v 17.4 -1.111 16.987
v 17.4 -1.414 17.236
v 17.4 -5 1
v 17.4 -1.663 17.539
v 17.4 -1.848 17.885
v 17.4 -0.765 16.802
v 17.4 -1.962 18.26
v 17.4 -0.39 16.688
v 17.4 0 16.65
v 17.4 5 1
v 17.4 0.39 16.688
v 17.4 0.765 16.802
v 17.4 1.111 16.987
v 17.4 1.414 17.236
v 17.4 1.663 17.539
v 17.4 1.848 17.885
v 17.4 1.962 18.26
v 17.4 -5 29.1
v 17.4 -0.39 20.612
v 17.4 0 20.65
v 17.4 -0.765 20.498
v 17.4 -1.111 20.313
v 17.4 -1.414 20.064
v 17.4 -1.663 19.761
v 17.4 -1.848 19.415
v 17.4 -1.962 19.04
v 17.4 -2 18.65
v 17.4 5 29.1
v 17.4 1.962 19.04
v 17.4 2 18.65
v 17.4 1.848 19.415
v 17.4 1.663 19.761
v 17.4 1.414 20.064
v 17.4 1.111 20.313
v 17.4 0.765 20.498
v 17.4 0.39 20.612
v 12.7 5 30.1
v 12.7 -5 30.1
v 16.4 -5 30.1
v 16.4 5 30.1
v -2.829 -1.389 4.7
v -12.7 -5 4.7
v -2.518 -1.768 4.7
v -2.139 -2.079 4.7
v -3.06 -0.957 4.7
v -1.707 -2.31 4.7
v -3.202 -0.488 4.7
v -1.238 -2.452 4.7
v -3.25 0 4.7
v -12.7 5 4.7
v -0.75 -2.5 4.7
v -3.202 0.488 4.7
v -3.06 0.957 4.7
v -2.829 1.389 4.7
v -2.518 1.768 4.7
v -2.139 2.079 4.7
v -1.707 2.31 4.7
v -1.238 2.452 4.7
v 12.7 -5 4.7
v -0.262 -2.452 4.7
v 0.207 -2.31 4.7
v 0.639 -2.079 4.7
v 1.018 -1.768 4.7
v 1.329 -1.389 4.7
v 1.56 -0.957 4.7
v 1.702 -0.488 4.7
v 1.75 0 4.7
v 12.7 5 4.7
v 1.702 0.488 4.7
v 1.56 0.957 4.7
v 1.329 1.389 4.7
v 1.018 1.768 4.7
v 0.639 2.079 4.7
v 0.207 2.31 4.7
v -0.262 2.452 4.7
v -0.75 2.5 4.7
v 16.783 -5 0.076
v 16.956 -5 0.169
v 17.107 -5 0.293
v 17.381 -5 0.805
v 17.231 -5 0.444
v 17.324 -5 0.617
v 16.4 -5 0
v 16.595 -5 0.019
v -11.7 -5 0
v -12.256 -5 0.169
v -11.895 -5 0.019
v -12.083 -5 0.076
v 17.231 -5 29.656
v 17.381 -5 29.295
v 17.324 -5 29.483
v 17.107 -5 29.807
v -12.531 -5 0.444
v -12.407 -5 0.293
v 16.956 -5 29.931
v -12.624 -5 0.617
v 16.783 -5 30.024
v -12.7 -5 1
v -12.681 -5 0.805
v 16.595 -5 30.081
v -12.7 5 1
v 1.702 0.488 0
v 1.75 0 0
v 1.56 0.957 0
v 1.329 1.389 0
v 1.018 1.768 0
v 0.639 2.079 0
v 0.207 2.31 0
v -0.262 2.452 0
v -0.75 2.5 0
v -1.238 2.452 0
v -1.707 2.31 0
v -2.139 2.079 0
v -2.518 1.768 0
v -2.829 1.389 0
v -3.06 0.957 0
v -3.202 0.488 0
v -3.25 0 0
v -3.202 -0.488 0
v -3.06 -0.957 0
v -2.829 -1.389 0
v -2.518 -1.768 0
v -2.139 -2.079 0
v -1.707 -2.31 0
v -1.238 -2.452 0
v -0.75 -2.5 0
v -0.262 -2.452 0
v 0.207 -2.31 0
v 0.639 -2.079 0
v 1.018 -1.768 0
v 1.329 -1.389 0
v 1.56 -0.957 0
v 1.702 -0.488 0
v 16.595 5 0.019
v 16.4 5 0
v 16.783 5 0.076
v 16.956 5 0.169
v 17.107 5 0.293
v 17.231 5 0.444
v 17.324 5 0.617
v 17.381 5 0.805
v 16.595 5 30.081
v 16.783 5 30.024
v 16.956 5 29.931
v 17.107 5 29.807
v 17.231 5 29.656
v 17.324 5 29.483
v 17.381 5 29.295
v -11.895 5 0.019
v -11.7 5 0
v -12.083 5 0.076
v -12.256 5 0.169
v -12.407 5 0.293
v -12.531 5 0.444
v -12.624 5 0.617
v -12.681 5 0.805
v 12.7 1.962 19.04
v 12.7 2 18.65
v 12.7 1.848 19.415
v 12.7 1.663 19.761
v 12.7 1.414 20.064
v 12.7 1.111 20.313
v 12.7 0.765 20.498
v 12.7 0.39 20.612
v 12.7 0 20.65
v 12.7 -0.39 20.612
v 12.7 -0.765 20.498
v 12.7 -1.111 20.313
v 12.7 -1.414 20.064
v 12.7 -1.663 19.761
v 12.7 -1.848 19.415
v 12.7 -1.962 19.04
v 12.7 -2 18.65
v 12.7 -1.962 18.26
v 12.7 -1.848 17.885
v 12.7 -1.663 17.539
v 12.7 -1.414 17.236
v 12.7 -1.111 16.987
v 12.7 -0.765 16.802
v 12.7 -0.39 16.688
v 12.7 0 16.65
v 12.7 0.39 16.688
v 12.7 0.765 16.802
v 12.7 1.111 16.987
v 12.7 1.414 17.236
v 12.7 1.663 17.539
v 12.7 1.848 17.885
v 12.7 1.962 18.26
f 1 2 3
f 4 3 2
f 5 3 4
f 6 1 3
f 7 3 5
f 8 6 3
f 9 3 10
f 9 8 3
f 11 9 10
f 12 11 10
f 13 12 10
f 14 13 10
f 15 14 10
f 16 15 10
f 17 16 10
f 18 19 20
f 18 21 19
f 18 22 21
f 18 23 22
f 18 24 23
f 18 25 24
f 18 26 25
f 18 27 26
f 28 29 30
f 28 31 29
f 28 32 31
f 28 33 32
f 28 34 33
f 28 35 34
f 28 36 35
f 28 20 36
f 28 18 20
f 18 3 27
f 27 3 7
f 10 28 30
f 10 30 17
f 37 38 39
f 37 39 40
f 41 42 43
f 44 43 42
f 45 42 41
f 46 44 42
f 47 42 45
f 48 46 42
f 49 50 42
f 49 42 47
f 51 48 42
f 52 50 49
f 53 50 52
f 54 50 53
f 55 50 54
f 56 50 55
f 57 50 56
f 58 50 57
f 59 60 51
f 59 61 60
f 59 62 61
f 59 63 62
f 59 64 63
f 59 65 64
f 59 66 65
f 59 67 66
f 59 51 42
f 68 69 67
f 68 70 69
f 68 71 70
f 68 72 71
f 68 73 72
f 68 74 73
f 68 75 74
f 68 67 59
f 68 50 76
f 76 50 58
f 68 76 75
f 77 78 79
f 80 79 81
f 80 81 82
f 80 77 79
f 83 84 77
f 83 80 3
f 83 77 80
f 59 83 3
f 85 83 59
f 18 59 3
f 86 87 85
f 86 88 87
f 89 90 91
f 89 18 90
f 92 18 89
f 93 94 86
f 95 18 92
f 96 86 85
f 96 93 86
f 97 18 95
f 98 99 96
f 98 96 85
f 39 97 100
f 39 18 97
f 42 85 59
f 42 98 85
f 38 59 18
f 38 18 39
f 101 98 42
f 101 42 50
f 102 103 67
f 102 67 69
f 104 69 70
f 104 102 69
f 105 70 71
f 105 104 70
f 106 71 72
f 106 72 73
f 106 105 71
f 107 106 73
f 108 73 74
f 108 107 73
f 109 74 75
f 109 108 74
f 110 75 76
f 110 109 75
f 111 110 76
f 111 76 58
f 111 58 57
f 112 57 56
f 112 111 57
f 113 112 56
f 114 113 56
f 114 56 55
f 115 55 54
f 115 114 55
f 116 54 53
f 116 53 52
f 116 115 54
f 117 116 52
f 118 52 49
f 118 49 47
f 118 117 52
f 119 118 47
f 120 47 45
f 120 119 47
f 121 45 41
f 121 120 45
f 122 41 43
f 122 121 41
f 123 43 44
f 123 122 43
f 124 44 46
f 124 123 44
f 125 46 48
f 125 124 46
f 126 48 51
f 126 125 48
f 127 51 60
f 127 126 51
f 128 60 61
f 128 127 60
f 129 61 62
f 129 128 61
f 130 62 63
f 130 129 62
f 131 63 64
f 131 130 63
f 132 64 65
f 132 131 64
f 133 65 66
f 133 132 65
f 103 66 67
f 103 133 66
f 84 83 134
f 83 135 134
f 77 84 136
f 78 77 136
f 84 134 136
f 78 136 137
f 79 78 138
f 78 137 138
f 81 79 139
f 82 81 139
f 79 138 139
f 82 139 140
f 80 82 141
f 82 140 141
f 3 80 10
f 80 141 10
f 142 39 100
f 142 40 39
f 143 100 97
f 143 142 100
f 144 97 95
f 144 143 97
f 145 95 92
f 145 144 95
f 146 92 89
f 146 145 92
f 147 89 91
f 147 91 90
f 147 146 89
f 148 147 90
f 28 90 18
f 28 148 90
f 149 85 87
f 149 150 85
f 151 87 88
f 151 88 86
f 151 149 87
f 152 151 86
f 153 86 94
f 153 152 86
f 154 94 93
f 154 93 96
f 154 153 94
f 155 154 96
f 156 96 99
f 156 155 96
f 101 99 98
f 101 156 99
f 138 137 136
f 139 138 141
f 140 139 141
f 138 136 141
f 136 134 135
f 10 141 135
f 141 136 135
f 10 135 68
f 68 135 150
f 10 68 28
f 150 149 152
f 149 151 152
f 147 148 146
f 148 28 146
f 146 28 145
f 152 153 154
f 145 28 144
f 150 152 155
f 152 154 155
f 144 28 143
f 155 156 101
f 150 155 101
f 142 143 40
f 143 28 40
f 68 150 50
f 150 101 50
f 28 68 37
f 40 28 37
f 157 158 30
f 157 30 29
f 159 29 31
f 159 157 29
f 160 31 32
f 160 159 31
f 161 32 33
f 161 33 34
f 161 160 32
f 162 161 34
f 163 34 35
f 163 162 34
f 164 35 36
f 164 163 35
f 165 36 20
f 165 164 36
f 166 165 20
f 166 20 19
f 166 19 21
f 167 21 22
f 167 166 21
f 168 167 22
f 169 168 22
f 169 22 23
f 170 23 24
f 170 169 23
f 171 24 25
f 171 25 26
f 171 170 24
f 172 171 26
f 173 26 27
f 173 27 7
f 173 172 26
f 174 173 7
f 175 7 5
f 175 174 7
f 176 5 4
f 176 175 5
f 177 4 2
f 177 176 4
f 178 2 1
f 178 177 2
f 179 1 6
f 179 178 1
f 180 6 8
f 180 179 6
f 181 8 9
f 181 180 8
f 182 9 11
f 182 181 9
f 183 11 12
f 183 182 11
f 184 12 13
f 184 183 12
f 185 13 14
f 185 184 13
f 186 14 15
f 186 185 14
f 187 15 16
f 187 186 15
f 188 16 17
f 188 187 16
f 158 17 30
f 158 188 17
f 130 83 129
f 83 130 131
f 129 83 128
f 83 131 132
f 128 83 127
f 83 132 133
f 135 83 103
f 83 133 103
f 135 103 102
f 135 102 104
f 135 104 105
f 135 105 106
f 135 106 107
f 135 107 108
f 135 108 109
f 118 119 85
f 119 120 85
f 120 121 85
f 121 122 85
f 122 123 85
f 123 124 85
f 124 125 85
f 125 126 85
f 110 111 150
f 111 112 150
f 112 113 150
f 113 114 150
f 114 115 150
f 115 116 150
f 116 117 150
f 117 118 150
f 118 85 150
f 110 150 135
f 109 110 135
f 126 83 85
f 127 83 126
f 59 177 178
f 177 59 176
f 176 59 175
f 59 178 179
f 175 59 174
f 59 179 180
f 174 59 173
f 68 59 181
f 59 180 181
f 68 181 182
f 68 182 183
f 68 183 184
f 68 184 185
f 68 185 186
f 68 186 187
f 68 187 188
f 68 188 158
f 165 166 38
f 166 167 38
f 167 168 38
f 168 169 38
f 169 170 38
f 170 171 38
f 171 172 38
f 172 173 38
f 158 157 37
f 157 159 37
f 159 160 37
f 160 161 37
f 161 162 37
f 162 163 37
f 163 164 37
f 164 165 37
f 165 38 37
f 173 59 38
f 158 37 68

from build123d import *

# Parameters (mm, degrees)
F0_W     = 25.4
F0_H     = 10
F0_R     = 2.5
F1_DEPTH = 4.7
F2_W     = 10
F2_H     = 30.1
F2_R     = 2
F3_DEPTH = 4.7
F4_R     = 1


with BuildPart() as f1:
    # F0 (on Top) → F1 (new body)
    with BuildSketch(Plane.XY):
        Rectangle(F0_W, F0_H)
        with Locations((-0.75, 0)):
            Circle(F0_R, mode=Mode.SUBTRACT)
    extrude(amount=F1_DEPTH)

    # F2 (on face) → F3 (join)
    with BuildSketch(Plane.YZ.offset(12.7)):
        with Locations((0, 15.05)):
            Rectangle(F2_W, F2_H)
        with Locations((0, 18.65)):
            Circle(F2_R, mode=Mode.SUBTRACT)
    extrude(amount=F3_DEPTH)

    # F4
    f4_edges = [f1.edges().sort_by_distance(p)[0] for p in [
        (17.4, 0, 30.1),
        (17.4, 0, 0),
        (-12.7, 0, 0),
    ]]
    fillet(f4_edges, radius=F4_R)


solid = f1.part
